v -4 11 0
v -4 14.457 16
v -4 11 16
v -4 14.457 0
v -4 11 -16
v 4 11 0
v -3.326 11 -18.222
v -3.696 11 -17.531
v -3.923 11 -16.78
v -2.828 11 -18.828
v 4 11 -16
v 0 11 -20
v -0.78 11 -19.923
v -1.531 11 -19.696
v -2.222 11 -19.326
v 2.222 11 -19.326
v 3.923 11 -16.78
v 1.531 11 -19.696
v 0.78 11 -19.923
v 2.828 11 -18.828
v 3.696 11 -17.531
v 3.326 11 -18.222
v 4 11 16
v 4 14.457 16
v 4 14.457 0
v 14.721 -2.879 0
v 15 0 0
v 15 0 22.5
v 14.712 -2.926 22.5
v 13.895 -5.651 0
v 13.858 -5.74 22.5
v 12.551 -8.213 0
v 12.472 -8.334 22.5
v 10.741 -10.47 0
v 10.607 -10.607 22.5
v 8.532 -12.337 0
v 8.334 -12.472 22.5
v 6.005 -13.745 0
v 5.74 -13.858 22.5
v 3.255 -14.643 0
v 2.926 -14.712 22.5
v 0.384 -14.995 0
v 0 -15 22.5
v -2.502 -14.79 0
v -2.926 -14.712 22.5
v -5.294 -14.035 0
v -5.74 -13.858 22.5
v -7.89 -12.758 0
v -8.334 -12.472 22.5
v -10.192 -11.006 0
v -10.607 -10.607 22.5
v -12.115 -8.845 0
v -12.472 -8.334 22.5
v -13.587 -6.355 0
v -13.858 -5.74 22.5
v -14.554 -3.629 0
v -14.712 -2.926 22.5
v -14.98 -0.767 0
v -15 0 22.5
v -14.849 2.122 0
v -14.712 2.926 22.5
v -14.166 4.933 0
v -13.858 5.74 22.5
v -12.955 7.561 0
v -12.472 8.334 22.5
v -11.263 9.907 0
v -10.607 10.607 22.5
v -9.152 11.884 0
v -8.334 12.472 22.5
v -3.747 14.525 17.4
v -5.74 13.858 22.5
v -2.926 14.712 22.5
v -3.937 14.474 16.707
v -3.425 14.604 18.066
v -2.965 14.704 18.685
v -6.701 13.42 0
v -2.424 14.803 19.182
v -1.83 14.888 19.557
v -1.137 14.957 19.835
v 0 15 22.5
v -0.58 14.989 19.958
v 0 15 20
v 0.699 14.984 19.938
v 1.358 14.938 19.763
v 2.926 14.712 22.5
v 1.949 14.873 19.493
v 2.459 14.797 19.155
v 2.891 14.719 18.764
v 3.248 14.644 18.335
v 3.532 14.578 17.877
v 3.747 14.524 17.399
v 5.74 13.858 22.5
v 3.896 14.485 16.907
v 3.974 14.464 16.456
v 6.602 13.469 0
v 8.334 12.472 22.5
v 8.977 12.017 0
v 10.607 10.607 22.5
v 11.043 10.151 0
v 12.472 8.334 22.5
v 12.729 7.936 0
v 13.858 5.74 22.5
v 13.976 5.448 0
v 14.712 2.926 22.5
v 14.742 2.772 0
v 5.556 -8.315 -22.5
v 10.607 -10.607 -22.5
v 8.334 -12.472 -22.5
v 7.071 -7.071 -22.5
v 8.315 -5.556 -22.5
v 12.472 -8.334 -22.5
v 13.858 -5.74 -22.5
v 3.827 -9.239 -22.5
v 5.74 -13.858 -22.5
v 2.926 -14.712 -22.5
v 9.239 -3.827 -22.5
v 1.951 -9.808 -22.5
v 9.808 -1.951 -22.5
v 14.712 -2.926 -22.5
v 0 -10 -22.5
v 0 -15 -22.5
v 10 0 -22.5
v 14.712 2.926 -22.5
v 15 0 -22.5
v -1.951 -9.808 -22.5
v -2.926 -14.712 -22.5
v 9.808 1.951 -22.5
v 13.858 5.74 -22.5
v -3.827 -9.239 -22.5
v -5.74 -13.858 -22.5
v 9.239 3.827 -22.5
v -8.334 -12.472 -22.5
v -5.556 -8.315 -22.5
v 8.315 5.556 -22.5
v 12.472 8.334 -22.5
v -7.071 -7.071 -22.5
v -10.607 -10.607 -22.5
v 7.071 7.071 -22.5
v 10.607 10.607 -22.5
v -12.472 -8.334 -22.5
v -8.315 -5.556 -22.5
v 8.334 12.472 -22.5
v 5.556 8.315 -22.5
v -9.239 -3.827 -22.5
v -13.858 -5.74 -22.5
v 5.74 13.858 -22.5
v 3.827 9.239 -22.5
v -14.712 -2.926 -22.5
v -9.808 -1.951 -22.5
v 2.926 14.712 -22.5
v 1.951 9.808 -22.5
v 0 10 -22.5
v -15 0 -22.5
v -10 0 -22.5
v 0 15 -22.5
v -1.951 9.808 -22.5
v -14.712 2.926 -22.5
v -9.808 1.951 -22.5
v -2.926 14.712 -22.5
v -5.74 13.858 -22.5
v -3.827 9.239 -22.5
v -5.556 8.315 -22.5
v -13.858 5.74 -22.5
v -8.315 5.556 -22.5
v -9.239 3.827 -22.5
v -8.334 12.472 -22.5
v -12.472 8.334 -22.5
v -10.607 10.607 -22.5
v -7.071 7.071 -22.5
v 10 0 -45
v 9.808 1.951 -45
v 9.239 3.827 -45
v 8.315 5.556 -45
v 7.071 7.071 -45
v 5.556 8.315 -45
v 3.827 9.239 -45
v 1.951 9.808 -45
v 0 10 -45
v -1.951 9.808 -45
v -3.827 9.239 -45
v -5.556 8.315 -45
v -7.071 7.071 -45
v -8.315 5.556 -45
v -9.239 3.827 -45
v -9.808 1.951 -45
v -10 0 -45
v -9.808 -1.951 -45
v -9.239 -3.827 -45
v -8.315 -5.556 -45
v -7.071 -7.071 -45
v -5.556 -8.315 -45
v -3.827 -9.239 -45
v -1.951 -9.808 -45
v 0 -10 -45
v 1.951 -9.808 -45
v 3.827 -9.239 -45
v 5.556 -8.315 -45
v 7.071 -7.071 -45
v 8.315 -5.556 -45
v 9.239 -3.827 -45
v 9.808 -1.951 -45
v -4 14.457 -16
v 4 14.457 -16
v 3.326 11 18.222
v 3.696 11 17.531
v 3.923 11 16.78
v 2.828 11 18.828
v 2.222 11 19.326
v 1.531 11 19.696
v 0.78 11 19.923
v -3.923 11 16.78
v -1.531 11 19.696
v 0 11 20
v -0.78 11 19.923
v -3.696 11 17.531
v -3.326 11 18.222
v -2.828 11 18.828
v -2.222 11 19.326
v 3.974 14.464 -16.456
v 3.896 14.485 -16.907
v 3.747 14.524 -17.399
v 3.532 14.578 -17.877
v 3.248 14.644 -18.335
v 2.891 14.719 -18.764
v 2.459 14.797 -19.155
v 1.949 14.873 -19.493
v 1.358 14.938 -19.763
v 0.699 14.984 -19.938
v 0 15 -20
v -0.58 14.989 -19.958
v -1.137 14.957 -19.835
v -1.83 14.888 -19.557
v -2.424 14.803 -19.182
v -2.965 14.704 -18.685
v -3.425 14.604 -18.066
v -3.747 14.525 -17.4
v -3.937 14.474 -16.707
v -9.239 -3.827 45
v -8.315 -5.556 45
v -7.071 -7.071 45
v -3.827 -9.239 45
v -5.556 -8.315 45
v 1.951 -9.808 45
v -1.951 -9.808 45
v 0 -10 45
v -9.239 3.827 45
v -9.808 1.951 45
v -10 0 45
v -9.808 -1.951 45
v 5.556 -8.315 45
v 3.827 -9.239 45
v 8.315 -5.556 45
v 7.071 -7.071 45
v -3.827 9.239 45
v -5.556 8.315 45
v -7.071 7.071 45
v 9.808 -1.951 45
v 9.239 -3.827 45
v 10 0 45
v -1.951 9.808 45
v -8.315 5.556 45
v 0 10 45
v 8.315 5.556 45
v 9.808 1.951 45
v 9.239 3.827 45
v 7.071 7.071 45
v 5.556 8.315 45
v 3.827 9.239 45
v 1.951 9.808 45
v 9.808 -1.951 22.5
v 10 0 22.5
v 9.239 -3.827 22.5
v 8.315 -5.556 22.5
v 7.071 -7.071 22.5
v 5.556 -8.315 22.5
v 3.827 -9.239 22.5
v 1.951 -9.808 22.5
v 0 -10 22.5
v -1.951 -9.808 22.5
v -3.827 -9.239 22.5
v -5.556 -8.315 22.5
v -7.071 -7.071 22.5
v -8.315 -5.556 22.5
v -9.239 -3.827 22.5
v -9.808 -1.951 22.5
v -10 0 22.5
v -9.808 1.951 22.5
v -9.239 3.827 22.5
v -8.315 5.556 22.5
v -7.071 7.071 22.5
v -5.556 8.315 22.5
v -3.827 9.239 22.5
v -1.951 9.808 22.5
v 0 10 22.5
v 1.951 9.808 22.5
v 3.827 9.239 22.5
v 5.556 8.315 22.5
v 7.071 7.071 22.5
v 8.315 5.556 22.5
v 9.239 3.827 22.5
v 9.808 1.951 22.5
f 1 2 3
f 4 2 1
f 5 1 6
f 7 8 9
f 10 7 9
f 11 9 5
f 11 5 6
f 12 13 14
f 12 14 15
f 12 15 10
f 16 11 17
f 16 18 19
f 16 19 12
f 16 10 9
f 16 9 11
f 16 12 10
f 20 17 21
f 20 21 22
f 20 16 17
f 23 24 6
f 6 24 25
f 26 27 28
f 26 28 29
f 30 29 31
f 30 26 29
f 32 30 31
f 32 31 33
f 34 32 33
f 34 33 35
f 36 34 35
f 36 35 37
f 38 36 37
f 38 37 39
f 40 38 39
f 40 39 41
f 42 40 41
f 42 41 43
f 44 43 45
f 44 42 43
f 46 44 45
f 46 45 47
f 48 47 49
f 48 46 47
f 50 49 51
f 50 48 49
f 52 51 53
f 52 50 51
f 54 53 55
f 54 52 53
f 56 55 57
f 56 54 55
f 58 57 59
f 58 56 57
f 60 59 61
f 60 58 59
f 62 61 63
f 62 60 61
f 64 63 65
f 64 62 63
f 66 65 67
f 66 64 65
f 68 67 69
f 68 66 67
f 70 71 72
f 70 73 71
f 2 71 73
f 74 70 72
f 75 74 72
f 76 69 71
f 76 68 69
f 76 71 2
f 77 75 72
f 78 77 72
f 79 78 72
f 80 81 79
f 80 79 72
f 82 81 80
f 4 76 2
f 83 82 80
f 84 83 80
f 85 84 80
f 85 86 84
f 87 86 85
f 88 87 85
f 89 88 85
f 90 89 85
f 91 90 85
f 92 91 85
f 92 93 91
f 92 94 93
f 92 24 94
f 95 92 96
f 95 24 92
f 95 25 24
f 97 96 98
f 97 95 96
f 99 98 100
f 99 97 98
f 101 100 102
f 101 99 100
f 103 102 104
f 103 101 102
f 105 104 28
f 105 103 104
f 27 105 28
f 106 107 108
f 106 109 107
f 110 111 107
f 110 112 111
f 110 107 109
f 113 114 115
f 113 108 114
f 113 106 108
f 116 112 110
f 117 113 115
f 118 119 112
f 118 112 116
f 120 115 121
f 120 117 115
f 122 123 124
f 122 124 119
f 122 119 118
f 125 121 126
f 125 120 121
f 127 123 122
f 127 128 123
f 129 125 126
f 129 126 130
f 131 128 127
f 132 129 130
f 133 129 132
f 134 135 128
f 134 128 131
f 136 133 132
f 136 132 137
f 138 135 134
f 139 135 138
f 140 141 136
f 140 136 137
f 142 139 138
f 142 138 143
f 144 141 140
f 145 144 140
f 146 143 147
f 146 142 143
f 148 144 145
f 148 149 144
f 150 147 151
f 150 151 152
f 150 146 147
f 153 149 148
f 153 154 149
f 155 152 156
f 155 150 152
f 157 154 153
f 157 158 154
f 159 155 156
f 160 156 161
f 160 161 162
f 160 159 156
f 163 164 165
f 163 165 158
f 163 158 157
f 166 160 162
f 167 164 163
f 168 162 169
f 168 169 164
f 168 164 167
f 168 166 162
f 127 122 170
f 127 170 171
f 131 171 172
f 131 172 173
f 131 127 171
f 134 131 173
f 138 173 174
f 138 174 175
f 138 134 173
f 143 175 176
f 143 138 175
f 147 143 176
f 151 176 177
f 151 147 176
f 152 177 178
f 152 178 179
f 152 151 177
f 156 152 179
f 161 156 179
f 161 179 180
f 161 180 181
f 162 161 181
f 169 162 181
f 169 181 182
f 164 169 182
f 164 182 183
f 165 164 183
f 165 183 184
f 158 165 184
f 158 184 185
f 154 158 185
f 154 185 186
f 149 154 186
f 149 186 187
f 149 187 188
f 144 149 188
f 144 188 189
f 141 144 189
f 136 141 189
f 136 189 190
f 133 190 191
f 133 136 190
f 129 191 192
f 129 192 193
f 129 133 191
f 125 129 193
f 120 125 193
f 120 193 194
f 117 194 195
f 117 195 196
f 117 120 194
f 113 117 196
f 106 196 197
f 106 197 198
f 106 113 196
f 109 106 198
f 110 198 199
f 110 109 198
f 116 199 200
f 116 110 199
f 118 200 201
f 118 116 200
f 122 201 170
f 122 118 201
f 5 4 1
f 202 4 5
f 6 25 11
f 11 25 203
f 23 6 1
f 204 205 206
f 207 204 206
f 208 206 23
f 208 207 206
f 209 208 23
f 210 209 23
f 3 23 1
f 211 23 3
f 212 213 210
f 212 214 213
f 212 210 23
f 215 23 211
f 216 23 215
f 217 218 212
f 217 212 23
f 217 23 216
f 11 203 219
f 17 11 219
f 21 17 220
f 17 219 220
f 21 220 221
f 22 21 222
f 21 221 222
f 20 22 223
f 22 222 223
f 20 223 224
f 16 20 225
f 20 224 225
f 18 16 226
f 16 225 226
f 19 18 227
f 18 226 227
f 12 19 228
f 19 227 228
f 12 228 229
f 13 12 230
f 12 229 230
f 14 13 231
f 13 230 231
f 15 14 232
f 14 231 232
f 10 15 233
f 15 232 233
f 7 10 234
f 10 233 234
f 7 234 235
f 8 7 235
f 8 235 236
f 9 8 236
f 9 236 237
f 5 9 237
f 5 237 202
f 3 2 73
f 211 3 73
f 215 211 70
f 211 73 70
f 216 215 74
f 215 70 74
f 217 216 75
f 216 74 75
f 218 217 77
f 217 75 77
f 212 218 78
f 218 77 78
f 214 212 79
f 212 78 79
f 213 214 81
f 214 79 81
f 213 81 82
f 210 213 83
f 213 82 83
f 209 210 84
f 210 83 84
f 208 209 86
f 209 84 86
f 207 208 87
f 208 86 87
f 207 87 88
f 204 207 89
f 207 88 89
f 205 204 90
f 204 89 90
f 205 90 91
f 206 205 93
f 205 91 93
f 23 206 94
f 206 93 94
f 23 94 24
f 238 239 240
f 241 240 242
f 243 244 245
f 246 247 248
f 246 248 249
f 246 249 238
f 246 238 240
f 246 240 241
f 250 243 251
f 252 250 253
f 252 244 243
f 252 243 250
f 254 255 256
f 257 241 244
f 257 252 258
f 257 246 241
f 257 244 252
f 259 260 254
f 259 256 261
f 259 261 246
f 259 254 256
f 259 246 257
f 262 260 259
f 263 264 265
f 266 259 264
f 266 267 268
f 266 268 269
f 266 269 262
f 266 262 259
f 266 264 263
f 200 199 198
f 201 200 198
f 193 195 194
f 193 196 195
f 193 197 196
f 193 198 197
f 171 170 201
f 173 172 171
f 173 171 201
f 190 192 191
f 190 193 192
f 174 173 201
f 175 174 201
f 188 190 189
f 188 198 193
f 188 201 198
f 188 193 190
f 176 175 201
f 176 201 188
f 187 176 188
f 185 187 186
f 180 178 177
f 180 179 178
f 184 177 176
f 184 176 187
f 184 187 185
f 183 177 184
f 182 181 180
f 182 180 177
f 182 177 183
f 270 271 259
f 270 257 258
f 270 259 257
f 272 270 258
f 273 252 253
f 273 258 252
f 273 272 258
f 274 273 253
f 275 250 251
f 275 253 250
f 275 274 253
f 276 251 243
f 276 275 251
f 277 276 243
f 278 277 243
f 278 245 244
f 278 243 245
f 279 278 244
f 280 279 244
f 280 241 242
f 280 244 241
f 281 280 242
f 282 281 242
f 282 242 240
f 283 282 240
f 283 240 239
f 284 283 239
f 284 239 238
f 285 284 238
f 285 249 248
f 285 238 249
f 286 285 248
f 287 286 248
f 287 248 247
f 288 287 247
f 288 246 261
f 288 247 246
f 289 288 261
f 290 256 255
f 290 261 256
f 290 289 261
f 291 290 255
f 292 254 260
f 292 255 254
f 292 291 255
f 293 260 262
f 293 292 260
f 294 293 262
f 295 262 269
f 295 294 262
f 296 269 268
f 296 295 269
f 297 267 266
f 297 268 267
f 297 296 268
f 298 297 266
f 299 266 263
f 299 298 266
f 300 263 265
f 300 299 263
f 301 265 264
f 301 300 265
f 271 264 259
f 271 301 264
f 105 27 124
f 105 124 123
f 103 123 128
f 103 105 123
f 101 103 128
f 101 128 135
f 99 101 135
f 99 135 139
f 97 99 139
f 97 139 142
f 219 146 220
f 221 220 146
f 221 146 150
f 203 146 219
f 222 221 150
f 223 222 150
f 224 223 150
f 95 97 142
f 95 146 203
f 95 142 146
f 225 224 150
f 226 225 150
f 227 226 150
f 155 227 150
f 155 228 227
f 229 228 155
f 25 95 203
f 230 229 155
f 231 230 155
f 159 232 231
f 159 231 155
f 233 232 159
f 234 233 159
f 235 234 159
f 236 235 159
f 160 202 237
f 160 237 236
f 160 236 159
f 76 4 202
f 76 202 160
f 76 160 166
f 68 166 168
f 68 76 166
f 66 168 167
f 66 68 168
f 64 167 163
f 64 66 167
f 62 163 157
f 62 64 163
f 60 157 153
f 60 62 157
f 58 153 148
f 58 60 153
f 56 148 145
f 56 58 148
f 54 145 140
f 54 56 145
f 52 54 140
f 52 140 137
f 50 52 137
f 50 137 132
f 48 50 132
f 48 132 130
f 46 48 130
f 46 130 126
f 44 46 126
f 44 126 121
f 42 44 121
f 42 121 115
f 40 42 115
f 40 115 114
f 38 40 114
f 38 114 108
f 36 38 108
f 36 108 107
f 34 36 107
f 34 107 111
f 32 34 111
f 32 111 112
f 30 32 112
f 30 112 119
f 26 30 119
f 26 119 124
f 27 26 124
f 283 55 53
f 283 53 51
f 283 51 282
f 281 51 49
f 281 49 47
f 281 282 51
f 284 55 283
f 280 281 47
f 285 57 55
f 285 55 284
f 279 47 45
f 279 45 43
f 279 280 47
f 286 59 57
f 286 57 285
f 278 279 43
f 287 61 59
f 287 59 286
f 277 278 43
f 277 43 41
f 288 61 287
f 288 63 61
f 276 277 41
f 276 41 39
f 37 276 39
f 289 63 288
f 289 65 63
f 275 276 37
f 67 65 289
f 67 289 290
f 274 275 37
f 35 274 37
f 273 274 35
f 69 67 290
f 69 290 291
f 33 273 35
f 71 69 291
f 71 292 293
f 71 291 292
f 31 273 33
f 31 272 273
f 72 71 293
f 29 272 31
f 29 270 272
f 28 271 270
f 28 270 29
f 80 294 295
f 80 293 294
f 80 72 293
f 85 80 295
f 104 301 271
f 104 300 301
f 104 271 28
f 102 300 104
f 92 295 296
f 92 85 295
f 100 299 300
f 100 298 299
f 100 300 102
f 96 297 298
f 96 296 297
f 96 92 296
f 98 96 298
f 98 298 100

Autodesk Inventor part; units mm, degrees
sketch "スケッチ1" plane through (0, 0, 0) normal (0, 0, 1) x (1, 0, 0)
  circle A0 centre (0, 0) radius 15
  dimension "d0" = 30
extrude "押し出し1" add sketch "スケッチ1" along normal blind 22.5
sketch "スケッチ2" plane through (0, 0, 22.5) normal (0, 0, 1) x (1, 0, 0)
  circle A0 centre (0, 0) radius 10
  dimension "d3" = 20
extrude "押し出し2" add sketch "スケッチ2" along normal blind 22.5
ref_plane "作業平面1" through (0, 15, 0) normal (0, 1, 0) x (-1, 0, 0)
sketch "スケッチ3" plane through (0, 15, 0) normal (0, 1, 0) x (-1, 0, 0)
  line L0 (0, 0) -> (0, 20)
  line L1 (0, 20) -> (0, 16)
  arc A0 (4, 16) -> (0, 20) centre (0, 16) ccw
  arc A1 (0, 20) -> (-4, 16) centre (0, 16) ccw
  line L2 (4, 16) -> (4, 0)
  line L3 (-4, 16) -> (-4, 0)
  line L4 (4, 0) -> (-4, 0)
  dimension "d7" = 20
  dimension "d8" = 4
extrude "押し出し3" cut sketch "スケッチ3" against normal blind 4
mirror "ミラー1" about plane through (0, 0, 0) normal (0, 0, 1) of "押し出し1", "押し出し2", "押し出し3"
properties part number "shaft1"
